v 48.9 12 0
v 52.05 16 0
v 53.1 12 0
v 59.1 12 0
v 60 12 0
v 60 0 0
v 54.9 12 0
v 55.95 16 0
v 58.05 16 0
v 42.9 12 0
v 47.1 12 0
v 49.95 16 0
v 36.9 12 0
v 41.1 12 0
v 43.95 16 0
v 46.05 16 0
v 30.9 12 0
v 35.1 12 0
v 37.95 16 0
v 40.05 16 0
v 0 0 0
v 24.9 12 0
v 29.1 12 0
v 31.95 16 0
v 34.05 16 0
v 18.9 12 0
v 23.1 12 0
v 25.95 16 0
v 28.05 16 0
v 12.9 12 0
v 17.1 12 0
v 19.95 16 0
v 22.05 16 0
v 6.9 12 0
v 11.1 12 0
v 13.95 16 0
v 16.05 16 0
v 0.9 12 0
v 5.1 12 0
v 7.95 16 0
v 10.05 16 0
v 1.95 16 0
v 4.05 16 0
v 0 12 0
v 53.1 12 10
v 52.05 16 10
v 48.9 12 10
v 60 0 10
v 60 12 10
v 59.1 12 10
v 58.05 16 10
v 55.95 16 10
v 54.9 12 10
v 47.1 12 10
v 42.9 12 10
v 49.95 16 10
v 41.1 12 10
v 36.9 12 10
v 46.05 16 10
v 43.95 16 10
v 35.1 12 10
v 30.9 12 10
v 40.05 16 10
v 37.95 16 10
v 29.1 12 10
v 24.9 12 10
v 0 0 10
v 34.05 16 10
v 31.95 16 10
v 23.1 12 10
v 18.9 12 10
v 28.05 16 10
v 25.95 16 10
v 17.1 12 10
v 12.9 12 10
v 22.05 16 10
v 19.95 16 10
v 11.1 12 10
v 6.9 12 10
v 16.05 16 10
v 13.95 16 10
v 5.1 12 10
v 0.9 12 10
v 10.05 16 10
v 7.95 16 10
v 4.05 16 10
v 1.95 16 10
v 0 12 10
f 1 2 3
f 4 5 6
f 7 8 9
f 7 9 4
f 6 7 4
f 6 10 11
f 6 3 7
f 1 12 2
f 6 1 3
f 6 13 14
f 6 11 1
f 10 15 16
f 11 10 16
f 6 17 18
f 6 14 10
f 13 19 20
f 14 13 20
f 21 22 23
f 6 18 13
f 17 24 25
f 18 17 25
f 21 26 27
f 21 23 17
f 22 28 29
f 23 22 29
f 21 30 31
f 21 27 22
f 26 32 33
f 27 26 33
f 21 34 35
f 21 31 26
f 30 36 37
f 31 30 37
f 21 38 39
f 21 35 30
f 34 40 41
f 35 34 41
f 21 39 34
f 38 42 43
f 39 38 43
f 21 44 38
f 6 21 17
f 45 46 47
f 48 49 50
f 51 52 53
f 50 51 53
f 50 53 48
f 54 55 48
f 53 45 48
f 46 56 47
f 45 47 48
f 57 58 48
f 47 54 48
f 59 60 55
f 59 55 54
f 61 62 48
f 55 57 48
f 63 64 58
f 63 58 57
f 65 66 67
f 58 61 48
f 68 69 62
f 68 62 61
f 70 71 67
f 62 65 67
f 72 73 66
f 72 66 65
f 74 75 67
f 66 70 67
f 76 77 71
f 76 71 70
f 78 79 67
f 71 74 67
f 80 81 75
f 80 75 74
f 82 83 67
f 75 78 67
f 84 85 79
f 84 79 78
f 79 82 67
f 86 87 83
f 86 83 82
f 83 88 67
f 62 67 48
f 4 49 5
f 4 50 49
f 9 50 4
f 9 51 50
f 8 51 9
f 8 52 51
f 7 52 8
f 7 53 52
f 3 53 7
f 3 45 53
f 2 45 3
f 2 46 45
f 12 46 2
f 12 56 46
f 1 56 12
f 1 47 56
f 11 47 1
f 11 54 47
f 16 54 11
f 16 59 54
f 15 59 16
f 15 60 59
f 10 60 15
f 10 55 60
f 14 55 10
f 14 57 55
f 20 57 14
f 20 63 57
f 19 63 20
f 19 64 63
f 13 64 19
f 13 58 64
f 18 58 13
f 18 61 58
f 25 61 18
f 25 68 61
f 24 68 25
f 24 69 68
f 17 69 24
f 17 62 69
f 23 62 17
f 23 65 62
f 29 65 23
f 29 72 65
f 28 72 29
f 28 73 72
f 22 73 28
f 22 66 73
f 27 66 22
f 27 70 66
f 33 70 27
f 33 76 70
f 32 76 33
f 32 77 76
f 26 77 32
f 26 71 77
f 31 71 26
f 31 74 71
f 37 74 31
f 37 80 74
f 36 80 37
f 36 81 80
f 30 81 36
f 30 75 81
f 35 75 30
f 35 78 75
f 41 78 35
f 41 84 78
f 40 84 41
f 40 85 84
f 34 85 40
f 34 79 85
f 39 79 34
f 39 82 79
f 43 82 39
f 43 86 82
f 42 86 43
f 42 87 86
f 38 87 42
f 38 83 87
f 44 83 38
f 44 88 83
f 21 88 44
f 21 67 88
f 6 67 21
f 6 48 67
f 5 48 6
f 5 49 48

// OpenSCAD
$fn = 32;

// ----------------------------------------------------------------------
// Gear rack: 10 teeth, pitch 6 mm
// ----------------------------------------------------------------------

// --- parameters (mm) ---
teeth = 10;               // number of teeth
pitch = 6;                // tooth pitch, X
root_w = 4.2;             // tooth width at the root
tip_w = 2.1;              // tooth width at the tip
base_h = 12;              // rack body height, Y
tooth_h = 4;              // tooth height above the body
plate_t = 10;             // rack width, Z (extrusion height)

rack_l = teeth * pitch;  // overall length
total_h = base_h + tooth_h;  // overall height

profile = [[0, 0], [60, 0], [60, 12], [59.1, 12], [58.05, 16], [55.95, 16], [54.9, 12], [53.1, 12], [52.05, 16], [49.95, 16], [48.9, 12], [47.1, 12], [46.05, 16], [43.95, 16], [42.9, 12], [41.1, 12], [40.05, 16], [37.95, 16], [36.9, 12], [35.1, 12], [34.05, 16], [31.95, 16], [30.9, 12], [29.1, 12], [28.05, 16], [25.95, 16], [24.9, 12], [23.1, 12], [22.05, 16], [19.95, 16], [18.9, 12], [17.1, 12], [16.05, 16], [13.95, 16], [12.9, 12], [11.1, 12], [10.05, 16], [7.95, 16], [6.9, 12], [5.1, 12], [4.05, 16], [1.95, 16], [0.9, 12], [0, 12]];  // primary outline, 44 points, counter clockwise

// --- the one profile operation ---
linear_extrude(height = plate_t) polygon(points = profile);
